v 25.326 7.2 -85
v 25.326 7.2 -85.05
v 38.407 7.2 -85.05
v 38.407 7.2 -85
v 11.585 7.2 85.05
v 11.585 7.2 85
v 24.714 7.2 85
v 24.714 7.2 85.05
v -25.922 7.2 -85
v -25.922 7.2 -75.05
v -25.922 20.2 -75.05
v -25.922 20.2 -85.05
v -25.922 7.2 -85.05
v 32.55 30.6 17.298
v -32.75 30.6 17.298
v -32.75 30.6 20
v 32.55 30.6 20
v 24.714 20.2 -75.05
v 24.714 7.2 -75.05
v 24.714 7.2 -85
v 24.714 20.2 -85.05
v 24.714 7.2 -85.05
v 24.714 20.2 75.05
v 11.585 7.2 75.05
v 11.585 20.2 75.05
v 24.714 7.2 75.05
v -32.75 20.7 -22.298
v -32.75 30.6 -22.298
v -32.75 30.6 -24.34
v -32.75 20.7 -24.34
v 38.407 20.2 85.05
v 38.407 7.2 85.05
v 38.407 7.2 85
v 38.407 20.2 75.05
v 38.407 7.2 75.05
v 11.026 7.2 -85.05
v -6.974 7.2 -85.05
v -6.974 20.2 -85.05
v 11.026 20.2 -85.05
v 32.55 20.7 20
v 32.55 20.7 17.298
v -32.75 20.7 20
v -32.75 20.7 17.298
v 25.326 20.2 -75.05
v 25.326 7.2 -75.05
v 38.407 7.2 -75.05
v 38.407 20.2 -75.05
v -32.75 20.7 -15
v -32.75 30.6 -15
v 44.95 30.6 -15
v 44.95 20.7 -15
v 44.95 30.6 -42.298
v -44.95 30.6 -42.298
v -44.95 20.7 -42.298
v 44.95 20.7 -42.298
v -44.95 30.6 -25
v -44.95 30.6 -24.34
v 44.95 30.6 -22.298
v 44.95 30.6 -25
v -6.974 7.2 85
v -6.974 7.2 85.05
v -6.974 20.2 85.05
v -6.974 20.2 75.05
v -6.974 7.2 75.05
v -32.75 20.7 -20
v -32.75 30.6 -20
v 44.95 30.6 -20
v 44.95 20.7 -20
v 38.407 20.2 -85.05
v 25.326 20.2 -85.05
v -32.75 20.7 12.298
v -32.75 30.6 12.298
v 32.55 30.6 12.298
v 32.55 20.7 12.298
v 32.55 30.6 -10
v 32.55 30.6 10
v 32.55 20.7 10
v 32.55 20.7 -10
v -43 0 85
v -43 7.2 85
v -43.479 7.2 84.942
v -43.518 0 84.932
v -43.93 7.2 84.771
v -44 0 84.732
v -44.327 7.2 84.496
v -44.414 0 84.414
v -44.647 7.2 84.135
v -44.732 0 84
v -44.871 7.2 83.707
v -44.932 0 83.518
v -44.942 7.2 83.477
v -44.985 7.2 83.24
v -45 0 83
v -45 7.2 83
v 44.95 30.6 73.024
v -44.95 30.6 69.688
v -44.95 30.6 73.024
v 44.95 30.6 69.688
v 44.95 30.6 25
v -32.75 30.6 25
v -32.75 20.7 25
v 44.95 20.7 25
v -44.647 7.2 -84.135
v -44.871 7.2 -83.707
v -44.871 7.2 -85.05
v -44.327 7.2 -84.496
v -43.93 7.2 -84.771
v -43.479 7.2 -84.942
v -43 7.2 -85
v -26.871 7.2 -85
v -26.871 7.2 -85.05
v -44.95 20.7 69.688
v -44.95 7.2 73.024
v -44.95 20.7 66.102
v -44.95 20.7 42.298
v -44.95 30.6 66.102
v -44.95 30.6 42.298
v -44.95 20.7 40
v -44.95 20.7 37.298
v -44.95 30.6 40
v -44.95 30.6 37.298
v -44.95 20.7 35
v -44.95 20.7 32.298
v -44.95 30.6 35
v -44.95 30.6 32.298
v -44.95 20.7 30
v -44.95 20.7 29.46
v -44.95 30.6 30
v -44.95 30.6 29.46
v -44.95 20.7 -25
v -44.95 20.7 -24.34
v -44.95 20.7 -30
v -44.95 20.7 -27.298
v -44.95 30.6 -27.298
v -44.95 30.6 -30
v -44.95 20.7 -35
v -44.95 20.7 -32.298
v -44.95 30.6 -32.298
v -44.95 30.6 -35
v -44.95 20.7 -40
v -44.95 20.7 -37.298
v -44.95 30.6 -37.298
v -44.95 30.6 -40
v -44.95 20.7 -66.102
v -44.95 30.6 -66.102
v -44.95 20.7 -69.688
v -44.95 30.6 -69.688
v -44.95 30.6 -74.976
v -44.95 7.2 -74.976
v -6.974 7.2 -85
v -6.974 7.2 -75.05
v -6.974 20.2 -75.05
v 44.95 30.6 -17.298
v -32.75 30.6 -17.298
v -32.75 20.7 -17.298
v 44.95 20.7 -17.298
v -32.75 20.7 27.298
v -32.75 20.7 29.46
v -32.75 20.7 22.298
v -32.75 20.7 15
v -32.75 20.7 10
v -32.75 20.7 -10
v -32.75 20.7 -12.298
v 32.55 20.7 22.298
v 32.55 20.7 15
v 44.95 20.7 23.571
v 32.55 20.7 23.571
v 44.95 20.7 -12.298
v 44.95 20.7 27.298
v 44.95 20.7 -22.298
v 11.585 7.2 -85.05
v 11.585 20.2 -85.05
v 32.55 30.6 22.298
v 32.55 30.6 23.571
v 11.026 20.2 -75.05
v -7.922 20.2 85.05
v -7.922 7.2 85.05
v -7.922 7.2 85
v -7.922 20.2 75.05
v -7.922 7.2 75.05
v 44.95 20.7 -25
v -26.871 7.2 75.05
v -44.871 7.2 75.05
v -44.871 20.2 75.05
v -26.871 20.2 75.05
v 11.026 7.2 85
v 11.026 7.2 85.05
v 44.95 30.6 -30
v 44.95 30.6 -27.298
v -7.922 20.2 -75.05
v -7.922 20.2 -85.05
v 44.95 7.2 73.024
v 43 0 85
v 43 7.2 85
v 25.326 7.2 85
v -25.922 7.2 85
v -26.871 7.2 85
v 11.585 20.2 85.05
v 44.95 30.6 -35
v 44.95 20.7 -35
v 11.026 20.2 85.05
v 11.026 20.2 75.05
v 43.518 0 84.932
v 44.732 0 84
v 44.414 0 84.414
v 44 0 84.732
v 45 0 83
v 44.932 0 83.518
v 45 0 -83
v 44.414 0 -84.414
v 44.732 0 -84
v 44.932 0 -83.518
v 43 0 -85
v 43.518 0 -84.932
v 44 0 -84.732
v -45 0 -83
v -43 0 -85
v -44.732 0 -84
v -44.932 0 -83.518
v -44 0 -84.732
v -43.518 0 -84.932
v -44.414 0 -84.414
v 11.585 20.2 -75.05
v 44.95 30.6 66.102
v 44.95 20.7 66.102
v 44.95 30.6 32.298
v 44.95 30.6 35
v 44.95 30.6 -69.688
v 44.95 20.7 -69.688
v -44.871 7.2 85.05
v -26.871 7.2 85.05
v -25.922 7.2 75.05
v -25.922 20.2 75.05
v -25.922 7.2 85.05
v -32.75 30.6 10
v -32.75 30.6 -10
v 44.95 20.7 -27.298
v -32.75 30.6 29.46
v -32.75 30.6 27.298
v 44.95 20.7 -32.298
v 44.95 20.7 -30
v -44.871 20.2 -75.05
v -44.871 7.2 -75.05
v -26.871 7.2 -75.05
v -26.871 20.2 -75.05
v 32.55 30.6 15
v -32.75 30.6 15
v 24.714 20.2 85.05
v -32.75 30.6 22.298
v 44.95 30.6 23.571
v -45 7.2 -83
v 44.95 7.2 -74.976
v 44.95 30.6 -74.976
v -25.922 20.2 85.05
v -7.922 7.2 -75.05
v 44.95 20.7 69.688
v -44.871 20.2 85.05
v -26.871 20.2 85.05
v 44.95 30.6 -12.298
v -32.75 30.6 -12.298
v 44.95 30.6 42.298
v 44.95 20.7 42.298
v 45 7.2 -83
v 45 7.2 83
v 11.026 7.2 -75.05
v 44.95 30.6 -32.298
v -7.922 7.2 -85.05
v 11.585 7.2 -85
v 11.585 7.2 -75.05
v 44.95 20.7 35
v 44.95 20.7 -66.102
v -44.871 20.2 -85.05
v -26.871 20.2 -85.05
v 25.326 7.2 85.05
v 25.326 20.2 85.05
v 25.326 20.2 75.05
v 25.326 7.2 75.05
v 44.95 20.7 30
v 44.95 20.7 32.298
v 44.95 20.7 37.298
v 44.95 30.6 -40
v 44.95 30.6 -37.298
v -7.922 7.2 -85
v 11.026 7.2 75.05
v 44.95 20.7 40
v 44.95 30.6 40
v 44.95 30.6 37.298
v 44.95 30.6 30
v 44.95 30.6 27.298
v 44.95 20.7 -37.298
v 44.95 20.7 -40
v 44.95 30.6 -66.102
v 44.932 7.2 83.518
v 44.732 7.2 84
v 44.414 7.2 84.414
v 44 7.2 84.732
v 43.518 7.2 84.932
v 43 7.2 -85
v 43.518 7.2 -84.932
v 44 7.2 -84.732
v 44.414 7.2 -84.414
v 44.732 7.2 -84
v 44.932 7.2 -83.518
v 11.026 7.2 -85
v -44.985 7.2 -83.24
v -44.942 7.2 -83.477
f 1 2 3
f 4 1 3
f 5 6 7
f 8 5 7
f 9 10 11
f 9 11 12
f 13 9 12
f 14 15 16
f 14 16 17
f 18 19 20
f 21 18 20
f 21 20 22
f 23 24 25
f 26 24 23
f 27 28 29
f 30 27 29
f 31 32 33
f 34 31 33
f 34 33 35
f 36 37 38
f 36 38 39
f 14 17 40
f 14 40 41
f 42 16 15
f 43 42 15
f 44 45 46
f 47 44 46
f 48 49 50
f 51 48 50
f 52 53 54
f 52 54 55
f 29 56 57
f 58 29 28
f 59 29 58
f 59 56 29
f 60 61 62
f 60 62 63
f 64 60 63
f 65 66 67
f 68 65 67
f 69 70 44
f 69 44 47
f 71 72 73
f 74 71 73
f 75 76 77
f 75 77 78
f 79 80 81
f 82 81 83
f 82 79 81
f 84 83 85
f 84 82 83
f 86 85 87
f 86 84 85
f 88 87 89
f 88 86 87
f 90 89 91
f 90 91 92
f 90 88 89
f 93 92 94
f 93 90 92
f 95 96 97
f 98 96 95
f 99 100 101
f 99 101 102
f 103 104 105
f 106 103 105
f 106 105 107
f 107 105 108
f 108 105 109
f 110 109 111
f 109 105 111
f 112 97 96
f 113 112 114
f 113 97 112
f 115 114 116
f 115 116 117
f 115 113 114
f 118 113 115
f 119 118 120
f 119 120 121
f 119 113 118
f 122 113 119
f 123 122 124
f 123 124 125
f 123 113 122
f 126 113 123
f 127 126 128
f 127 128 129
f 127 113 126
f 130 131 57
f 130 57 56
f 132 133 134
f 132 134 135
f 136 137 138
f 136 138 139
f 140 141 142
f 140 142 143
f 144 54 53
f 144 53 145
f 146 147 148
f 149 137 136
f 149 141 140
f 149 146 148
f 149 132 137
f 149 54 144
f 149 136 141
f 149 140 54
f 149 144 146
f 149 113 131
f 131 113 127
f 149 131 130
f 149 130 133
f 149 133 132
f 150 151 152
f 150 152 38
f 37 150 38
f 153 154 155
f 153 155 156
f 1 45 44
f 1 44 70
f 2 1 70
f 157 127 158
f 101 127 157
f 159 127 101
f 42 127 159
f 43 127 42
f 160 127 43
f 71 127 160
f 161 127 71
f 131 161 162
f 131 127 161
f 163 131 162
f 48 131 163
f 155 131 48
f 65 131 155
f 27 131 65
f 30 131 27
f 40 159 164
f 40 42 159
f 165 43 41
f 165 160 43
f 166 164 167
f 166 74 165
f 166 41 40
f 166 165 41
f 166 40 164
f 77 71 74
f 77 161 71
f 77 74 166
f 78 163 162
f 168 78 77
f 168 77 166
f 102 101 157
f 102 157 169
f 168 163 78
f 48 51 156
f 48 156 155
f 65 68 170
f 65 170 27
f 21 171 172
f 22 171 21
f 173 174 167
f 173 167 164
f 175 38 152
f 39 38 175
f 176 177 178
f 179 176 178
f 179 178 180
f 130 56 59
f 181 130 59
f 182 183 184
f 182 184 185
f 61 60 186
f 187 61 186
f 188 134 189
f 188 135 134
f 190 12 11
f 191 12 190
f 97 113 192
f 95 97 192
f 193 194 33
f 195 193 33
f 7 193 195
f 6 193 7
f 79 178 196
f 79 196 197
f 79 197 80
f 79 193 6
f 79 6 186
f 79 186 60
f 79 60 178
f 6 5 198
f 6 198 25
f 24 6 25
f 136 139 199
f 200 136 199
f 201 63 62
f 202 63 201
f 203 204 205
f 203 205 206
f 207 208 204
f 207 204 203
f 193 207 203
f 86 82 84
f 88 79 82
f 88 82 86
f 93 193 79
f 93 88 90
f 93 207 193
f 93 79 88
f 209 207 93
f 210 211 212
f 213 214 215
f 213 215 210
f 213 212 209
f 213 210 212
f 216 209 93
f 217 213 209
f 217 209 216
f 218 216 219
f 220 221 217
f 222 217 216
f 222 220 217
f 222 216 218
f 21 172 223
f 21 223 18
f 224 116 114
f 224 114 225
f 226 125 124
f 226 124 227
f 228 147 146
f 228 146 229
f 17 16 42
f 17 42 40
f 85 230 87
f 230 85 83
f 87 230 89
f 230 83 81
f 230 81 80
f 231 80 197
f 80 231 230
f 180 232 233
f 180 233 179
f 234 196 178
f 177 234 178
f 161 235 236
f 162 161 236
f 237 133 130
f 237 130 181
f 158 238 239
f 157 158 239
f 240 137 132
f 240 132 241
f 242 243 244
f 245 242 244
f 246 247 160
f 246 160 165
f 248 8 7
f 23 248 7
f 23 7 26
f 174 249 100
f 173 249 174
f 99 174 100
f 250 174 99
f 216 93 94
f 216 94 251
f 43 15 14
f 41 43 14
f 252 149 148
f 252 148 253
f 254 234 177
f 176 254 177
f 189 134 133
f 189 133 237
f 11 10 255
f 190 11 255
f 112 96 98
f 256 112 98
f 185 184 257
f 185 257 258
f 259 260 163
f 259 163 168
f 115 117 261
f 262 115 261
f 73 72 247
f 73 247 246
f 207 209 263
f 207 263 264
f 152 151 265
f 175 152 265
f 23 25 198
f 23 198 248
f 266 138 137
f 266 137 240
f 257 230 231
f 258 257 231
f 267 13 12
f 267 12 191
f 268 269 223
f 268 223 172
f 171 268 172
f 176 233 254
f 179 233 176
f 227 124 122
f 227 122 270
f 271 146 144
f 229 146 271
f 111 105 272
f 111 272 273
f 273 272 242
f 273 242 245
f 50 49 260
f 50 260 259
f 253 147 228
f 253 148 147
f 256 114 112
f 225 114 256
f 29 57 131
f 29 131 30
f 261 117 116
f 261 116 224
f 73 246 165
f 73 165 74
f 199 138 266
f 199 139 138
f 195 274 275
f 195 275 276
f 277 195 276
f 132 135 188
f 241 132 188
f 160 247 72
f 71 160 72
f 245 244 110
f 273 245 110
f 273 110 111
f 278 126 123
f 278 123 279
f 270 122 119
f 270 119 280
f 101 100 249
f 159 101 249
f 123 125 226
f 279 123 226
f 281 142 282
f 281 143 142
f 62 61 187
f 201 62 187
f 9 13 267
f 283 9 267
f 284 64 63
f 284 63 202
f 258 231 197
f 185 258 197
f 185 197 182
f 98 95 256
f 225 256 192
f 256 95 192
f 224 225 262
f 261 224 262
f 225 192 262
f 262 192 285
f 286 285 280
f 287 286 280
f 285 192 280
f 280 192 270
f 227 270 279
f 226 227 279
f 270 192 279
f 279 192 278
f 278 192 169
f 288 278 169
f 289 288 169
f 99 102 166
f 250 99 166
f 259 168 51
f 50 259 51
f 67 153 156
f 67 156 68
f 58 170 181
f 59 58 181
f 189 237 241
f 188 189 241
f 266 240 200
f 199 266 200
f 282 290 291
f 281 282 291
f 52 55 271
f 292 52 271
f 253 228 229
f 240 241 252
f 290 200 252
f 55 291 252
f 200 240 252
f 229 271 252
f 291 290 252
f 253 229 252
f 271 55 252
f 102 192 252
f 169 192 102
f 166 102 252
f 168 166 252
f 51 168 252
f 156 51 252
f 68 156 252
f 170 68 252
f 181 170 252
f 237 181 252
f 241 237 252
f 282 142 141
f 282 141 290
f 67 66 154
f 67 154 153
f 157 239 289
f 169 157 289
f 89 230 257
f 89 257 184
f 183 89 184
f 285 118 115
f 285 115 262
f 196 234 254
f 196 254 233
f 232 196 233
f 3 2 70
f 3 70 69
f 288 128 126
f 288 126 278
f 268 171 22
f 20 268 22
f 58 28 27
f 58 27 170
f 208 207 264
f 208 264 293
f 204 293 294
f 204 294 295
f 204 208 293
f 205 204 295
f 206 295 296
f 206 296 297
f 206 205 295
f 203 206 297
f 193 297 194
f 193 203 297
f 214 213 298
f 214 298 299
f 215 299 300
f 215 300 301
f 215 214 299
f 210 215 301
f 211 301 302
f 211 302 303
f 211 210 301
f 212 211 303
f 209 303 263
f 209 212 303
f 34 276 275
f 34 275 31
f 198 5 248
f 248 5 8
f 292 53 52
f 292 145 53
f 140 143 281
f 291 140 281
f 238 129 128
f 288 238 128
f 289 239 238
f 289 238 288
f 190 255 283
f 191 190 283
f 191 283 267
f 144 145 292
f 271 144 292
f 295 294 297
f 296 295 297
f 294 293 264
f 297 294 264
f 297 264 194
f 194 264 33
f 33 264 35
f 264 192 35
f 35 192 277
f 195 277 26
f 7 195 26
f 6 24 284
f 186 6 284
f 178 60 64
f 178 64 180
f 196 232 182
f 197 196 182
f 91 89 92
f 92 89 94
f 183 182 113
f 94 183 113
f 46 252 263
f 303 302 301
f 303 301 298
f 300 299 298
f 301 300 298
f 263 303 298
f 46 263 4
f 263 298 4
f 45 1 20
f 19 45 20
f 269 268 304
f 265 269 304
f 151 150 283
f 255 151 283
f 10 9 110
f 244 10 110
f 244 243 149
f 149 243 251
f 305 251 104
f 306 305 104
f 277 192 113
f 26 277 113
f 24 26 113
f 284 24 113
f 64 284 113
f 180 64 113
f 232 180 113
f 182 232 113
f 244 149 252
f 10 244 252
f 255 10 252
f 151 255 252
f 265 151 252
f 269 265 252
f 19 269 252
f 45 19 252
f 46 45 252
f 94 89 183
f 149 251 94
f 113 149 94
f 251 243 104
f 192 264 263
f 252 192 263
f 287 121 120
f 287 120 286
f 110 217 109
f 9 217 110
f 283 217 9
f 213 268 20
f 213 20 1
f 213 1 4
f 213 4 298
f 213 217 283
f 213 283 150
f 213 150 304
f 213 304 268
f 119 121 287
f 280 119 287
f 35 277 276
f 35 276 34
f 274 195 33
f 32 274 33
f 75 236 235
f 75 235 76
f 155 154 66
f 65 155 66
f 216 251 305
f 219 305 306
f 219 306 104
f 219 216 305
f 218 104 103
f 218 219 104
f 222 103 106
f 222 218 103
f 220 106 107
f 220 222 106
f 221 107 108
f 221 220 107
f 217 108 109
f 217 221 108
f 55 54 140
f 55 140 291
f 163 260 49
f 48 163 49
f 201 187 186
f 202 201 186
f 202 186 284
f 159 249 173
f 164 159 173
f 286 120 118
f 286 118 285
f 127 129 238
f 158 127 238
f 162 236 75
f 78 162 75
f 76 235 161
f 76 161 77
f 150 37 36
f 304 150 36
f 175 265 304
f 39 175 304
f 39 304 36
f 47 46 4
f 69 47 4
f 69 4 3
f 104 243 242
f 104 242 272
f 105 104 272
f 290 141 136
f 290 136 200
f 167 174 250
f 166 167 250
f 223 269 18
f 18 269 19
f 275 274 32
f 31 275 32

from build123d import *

# Parameters (mm, degrees)
BOSS_EXTRUDE1_DEPTH = 7.2
SKETCH2_W           = 89.9
SKETCH2_H           = 148
BOSS_EXTRUDE2_DEPTH = 23.4
SKETCH3_W           = 12.2
SKETCH3_H           = 53.8
SKETCH3_W_2         = 12.4
SKETCH3_H_2         = 34.48
CUT_EXTRUDE1_DEPTH  = 9.9
SKETCH4_W           = 89.9
SKETCH4_H           = 3.586904051
SKETCH4_W_2         = 90
SKETCH4_H_2         = 2.297698364
CUT_EXTRUDE2_DEPTH  = 9.9
SKETCH5_W           = 18
SKETCH5_H           = 10
SKETCH5_W_2         = 13.128765808
SKETCH5_W_3         = 13.081709299
BOSS_EXTRUDE3_DEPTH = 13


with BuildPart() as part:
    # Sketch1 → Boss-Extrude1 (new body)
    with BuildSketch(Plane(origin=(0, 0, 0), x_dir=(1, 0, 0), z_dir=(0, 1, 0))):
        with BuildLine():
            Line((43, -85), (-43, -85))
            ThreePointArc((-43, -85), (-44.414213562, -84.414213562), (-45, -83))
            Line((-45, -83), (-45, 83))
            ThreePointArc((-45, 83), (-44.414213562, 84.414213562), (-43, 85))
            Line((-43, 85), (43, 85))
            ThreePointArc((43, 85), (44.414213562, 84.414213562), (45, 83))
            Line((45, 83), (45, -83))
            ThreePointArc((45, -83), (44.414213562, -84.414213562), (43, -85))
        make_face()
    extrude(amount=BOSS_EXTRUDE1_DEPTH)

    # Sketch2 → Boss-Extrude2 (add)
    with BuildSketch(Plane(origin=(0, 7.2, 0), x_dir=(1, 0, 0), z_dir=(0, 1, 0))):
        with Locations((0, 0.976122618)):
            Rectangle(SKETCH2_W, SKETCH2_H)
    extrude(amount=BOSS_EXTRUDE2_DEPTH)

    # Sketch3 → Cut-Extrude1 (cut)
    with BuildSketch(Plane(origin=(0, 30.6, 0), x_dir=(1, 0, 0), z_dir=(0, 1, 0))):
        with Locations((-38.85, -2.560293939)):
            Rectangle(SKETCH3_W, SKETCH3_H)
        with Locations((38.75, -6.331083764)):
            Rectangle(SKETCH3_W_2, SKETCH3_H_2)
    extrude(amount=-CUT_EXTRUDE1_DEPTH, mode=Mode.SUBTRACT)

    # Sketch4 → Cut-Extrude2 (cut)
    with BuildSketch(Plane(origin=(0, 30.6, 0), x_dir=(1, 0, 0), z_dir=(0, 1, 0))):
        with Locations((0, 67.894969538)):
            Rectangle(SKETCH4_W, SKETCH4_H)
        with Locations((0, 11.148849182)):
            Rectangle(SKETCH4_W_2, SKETCH4_H_2)
        with Locations((0, 16.148849182)):
            Rectangle(SKETCH4_W_2, SKETCH4_H_2)
        with Locations((0, 21.148849182)):
            Rectangle(SKETCH4_W_2, SKETCH4_H_2)
        with Locations((0, 26.148849182)):
            Rectangle(SKETCH4_W_2, SKETCH4_H_2)
        with Locations((0, 31.148849182)):
            Rectangle(SKETCH4_W_2, SKETCH4_H_2)
        with Locations((0, 36.148849182)):
            Rectangle(SKETCH4_W_2, SKETCH4_H_2)
        with Locations((0, 41.148849182)):
            Rectangle(SKETCH4_W_2, SKETCH4_H_2)
        with Locations((0, -41.148849182)):
            Rectangle(SKETCH4_W_2, SKETCH4_H_2)
        with Locations((0, -36.148849182)):
            Rectangle(SKETCH4_W_2, SKETCH4_H_2)
        with Locations((0, -31.148849182)):
            Rectangle(SKETCH4_W_2, SKETCH4_H_2)
        with Locations((0, -26.148849182)):
            Rectangle(SKETCH4_W_2, SKETCH4_H_2)
        with Locations((0, -21.148849182)):
            Rectangle(SKETCH4_W_2, SKETCH4_H_2)
        with Locations((0, -16.148849182)):
            Rectangle(SKETCH4_W_2, SKETCH4_H_2)
        with Locations((0, -11.148849182)):
            Rectangle(SKETCH4_W_2, SKETCH4_H_2)
        with Locations((0, -67.894969538)):
            Rectangle(SKETCH4_W, SKETCH4_H)
    extrude(amount=-CUT_EXTRUDE2_DEPTH, mode=Mode.SUBTRACT)

    # Sketch5 → Boss-Extrude3 (add)
    with BuildSketch(Plane(origin=(0, 7.2, 0), x_dir=(1, 0, 0), z_dir=(0, 1, 0))):
        with Locations((-35.870753406, -80.05)):
            Rectangle(SKETCH5_W, SKETCH5_H)
        with Locations((-16.922452044, -80.05)):
            Rectangle(SKETCH5_W, SKETCH5_H)
        with Locations((2.025849319, -80.05)):
            Rectangle(SKETCH5_W, SKETCH5_H)
        with Locations((18.149473412, -80.05)):
            Rectangle(SKETCH5_W_2, SKETCH5_H)
        with Locations((31.866445574, -80.05)):
            Rectangle(SKETCH5_W_3, SKETCH5_H)
        with Locations((31.866445574, 80.05)):
            Rectangle(SKETCH5_W_3, SKETCH5_H)
        with Locations((18.149473412, 80.05)):
            Rectangle(SKETCH5_W_2, SKETCH5_H)
        with Locations((2.025849319, 80.05)):
            Rectangle(SKETCH5_W, SKETCH5_H)
        with Locations((-16.922452044, 80.05)):
            Rectangle(SKETCH5_W, SKETCH5_H)
        with Locations((-35.870753406, 80.05)):
            Rectangle(SKETCH5_W, SKETCH5_H)
    extrude(amount=BOSS_EXTRUDE3_DEPTH)


solid = part.part
